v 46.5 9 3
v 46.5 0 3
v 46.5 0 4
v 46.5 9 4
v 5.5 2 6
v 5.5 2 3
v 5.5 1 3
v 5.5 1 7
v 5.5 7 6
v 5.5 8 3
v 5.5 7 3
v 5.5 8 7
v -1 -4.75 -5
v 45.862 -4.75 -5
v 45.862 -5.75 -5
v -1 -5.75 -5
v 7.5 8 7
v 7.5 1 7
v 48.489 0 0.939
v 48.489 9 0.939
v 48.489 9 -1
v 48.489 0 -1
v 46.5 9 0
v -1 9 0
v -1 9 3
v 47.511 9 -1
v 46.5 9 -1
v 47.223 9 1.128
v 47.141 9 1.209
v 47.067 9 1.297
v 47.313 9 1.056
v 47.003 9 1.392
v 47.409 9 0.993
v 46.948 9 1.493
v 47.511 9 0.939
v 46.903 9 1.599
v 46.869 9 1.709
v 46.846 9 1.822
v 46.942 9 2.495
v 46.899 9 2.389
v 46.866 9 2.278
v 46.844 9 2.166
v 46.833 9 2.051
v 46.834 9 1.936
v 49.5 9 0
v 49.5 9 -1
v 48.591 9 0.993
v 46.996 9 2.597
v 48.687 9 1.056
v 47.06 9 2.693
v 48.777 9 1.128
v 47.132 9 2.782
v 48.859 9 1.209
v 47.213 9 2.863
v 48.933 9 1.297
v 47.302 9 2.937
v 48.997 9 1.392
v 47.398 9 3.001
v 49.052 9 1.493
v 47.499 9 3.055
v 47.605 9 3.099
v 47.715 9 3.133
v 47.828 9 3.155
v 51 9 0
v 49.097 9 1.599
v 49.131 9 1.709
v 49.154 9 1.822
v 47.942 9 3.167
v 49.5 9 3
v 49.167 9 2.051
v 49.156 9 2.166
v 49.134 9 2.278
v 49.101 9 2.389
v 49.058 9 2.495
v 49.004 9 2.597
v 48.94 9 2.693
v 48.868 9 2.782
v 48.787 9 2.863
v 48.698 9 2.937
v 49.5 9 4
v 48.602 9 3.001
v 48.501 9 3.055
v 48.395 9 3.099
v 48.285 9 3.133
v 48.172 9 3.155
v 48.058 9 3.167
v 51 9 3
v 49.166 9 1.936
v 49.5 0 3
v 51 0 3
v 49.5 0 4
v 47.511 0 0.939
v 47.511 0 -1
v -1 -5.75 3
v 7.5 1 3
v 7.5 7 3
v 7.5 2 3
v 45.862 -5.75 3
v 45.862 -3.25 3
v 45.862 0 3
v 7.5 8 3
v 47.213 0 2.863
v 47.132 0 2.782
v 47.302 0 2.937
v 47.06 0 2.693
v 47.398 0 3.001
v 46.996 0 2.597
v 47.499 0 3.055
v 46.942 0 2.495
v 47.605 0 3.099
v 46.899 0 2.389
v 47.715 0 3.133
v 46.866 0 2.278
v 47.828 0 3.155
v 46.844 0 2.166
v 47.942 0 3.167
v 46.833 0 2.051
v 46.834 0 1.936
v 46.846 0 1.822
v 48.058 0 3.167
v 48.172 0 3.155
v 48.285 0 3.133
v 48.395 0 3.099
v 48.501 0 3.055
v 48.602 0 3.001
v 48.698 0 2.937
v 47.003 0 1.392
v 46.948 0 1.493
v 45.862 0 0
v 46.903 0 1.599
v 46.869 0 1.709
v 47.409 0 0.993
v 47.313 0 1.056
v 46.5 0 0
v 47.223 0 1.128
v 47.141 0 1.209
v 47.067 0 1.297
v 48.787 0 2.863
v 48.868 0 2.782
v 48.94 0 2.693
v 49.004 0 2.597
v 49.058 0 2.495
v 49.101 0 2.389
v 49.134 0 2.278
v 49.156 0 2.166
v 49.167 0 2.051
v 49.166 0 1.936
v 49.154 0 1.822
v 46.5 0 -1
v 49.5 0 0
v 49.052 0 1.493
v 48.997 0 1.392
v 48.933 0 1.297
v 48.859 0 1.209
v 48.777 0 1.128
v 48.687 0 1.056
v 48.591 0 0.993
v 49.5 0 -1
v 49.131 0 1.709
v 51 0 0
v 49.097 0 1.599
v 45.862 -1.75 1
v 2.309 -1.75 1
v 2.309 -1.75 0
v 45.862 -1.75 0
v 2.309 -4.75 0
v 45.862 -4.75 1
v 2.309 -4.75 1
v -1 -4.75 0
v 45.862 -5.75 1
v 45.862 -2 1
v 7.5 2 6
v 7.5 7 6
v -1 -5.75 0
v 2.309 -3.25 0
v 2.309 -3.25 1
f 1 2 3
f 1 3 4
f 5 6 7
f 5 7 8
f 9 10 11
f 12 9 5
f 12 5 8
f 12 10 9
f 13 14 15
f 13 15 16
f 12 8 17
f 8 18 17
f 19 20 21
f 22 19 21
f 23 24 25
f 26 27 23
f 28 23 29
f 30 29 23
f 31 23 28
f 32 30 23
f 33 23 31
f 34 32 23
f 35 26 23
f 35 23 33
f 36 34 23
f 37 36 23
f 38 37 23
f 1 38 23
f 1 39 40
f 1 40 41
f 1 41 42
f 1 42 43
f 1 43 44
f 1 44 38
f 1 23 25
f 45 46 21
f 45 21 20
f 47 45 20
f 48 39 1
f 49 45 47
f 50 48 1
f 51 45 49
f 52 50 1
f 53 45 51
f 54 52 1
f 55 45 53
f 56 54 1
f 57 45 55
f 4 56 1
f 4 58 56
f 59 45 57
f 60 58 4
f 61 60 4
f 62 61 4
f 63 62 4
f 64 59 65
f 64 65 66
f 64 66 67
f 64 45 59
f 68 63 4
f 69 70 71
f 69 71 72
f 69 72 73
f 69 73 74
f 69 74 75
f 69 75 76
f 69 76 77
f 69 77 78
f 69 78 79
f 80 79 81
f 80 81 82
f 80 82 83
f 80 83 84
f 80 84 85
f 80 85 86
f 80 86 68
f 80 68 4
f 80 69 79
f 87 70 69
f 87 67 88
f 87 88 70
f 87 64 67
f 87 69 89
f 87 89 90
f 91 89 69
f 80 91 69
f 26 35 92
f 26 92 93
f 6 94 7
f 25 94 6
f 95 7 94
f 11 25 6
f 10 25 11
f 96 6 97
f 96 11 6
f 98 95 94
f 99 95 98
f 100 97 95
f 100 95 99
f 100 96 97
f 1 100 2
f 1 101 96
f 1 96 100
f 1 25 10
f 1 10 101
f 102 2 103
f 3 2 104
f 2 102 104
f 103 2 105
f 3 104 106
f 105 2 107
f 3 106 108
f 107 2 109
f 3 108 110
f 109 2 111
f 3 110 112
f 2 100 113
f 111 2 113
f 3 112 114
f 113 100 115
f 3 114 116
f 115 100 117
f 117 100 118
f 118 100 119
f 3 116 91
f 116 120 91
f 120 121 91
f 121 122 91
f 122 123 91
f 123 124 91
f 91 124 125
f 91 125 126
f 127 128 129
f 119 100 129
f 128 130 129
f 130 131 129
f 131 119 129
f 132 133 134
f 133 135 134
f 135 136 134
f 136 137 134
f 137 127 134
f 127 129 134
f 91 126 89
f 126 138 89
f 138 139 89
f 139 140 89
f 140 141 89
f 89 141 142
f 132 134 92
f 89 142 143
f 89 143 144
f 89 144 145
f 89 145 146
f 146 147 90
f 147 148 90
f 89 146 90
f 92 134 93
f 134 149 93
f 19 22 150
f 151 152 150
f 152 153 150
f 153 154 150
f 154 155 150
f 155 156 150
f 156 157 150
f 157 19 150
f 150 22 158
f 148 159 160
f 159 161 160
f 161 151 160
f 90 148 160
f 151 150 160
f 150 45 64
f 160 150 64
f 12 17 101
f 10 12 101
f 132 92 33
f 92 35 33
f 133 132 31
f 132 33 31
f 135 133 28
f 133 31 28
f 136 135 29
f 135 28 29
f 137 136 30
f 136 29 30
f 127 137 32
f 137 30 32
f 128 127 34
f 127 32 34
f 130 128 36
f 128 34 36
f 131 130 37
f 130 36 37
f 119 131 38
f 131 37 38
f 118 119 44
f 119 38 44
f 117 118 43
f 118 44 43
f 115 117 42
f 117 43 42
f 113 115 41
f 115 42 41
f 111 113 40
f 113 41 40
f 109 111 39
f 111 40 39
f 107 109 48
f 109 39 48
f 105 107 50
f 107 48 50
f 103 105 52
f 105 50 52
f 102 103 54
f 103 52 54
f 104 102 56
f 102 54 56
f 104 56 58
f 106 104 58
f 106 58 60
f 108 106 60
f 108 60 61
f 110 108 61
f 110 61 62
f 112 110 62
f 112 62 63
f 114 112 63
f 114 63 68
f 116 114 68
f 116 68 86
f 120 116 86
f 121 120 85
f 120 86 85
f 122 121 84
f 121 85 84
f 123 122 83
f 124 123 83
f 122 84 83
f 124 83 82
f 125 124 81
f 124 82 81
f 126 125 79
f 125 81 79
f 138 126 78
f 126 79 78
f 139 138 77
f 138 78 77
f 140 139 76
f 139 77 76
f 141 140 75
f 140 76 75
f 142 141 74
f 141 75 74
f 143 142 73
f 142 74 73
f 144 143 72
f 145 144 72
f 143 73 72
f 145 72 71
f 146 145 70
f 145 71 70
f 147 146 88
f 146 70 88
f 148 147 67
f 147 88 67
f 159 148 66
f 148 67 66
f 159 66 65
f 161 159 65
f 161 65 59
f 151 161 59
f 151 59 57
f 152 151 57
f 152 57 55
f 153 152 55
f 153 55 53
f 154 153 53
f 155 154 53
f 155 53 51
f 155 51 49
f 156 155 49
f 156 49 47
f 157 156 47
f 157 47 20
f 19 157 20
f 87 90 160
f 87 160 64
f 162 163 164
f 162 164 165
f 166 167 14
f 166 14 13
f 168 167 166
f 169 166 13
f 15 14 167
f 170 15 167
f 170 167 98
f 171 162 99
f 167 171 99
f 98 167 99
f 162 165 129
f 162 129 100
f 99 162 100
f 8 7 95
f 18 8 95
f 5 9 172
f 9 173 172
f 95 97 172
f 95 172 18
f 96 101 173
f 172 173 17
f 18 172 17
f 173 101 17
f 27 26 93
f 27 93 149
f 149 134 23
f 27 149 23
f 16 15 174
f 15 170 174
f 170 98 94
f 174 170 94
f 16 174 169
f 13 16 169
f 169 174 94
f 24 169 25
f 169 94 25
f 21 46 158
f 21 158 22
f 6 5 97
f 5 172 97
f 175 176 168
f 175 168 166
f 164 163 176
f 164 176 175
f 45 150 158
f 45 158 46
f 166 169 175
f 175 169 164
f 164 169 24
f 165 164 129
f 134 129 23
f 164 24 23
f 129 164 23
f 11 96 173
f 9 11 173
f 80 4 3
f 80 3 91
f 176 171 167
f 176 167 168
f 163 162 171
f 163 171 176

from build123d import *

# Parameters (mm, degrees)
SKETCH2_W            = 53
SKETCH2_H            = 9
BOSS_EXTRUDE1_DEPTH  = 3
SKETCH11_W           = 2
SKETCH11_H           = 9
CUT_EXTRUDE3_DEPTH   = 5
SKETCH12_W           = 3
SKETCH12_H           = 9
BOSS_EXTRUDE7_DEPTH  = 1
SKETCH13_W           = 1
SKETCH13_H           = 1
BOSS_EXTRUDE8_DEPTH  = 4
SKETCH14_W           = 1
SKETCH14_H           = 1
BOSS_EXTRUDE9_DEPTH  = 5
SKETCH15_W           = 45.862173985
SKETCH15_H           = 3
BOSS_EXTRUDE10_DEPTH = 1.5
SKETCH25_W           = 3
SKETCH25_H           = 9
BOSS_EXTRUDE13_DEPTH = 1
SKETCH24_R           = 1.16794594
CUT_EXTRUDE7_DEPTH   = 9
SKETCH26_W           = 0.9784551
SKETCH26_H           = 1.939455742
CUT_EXTRUDE8_DEPTH   = 9
SKETCH27_W           = 45.862173985
SKETCH27_H           = 3
BOSS_EXTRUDE14_DEPTH = 2
SKETCH28_W           = 41.224865511
SKETCH28_H           = 1
CUT_EXTRUDE9_DEPTH   = 1.5
SKETCH29_W           = 3
SKETCH29_H           = 12.5
BOSS_EXTRUDE15_DEPTH = 1
BOSS_EXTRUDE16_DEPTH = 1
SKETCH31_W           = 2.328454802
SKETCH31_H           = 1
CUT_EXTRUDE10_DEPTH  = 1.5
BOSS_EXTRUDE17_DEPTH = 2
BOSS_EXTRUDE18_REACH = 53.942
SKETCH34_W           = 46.86
SKETCH34_H           = 1.5
SKETCH35_W           = 43.553320313
SKETCH35_H           = 1.25
CUT_EXTRUDE11_DEPTH  = 1
CUT_EXTRUDE12_REACH  = 54.259
SKETCH36_W           = 46.86
SKETCH36_H           = 3.75
SKETCH37_W           = 2
SKETCH37_H           = 2.25
CUT_EXTRUDE13_DEPTH  = 10
BOSS_EXTRUDE19_DEPTH = 2.5
SKETCH42_W           = 43.553320313
SKETCH42_H           = 1
BOSS_EXTRUDE20_DEPTH = 1
SKETCH44_W           = 46.862173985
SKETCH44_H           = 1
BOSS_EXTRUDE21_DEPTH = 5
SKETCH46_W           = 43.553320313
SKETCH46_H           = 1
BOSS_EXTRUDE22_DEPTH = 1


with BuildPart() as part:
    # Sketch2 → Boss-Extrude1 (new body)
    with BuildSketch(Plane.XY):
        with Locations((26.5, 4.5)):
            Rectangle(SKETCH2_W, SKETCH2_H)
    extrude(amount=BOSS_EXTRUDE1_DEPTH)

    # Sketch11 → Cut-Extrude3 (cut)
    with BuildSketch(Plane.XY.offset(3)):
        with Locations((52, 4.5)):
            Rectangle(SKETCH11_W, SKETCH11_H)
    extrude(amount=-CUT_EXTRUDE3_DEPTH, mode=Mode.SUBTRACT)

    # Sketch12 → Boss-Extrude7 (add)
    with BuildSketch(Plane.XY.offset(3)):
        with Locations((48, 4.5)):
            Rectangle(SKETCH12_W, SKETCH12_H)
    extrude(amount=BOSS_EXTRUDE7_DEPTH)

    # Sketch13 → Boss-Extrude8 (add)
    with BuildSketch(Plane.XY.offset(3)):
        with Locations((7, 7.5)):
            Rectangle(SKETCH13_W, SKETCH13_H)
        with Locations((7, 1.5)):
            Rectangle(SKETCH13_W, SKETCH13_H)
    extrude(amount=BOSS_EXTRUDE8_DEPTH)

    # Sketch14 → Boss-Extrude9 (add)
    with BuildSketch(Plane.XZ.offset(-7)):
        with Locations((7, 6.5)):
            Rectangle(SKETCH14_W, SKETCH14_H)
    extrude(amount=BOSS_EXTRUDE9_DEPTH)

    # Sketch15 → Boss-Extrude10 (add)
    with BuildSketch(Plane.XZ):
        with Locations((22.931086993, 1.5)):
            Rectangle(SKETCH15_W, SKETCH15_H)
    extrude(amount=BOSS_EXTRUDE10_DEPTH)

    # Sketch25 → Boss-Extrude13 (add)
    with BuildSketch(Plane(origin=(0, 0, 0), x_dir=(-1, 0, 0), z_dir=(0, 0, -1))):
        with Locations((-48, 4.5)):
            Rectangle(SKETCH25_W, SKETCH25_H)
    extrude(amount=BOSS_EXTRUDE13_DEPTH)

    # Sketch24 → Cut-Extrude7 (cut)
    with BuildSketch(Plane(origin=(0, 9, 0), x_dir=(1, 0, 0), z_dir=(0, 1, 0))):
        with Locations(Location((48, -2, 0), (0, 0, 270))):
            Circle(SKETCH24_R)
    extrude(amount=-CUT_EXTRUDE7_DEPTH, mode=Mode.SUBTRACT)

    # Sketch26 → Cut-Extrude8 (cut)
    with BuildSketch(Plane(origin=(0, 9, 0), x_dir=(1, 0, 0), z_dir=(0, 1, 0))):
        with Locations((48, 0.030272129)):
            Rectangle(SKETCH26_W, SKETCH26_H)
    extrude(amount=-CUT_EXTRUDE8_DEPTH, mode=Mode.SUBTRACT)

    # Sketch27 → Boss-Extrude14 (add)
    with BuildSketch(Plane.XZ.offset(1.5)):
        with Locations((22.931086993, 1.5)):
            Rectangle(SKETCH27_W, SKETCH27_H)
    extrude(amount=BOSS_EXTRUDE14_DEPTH)

    # Sketch28 → Cut-Extrude9 (cut)
    with BuildSketch(Plane.XZ.offset(3.5)):
        with Locations((22.921286428, 0.5)):
            Rectangle(SKETCH28_W, SKETCH28_H)
    extrude(amount=-CUT_EXTRUDE9_DEPTH, mode=Mode.SUBTRACT)

    # Sketch29 → Boss-Extrude15 (add)
    with BuildSketch(Plane.ZY):
        with Locations((1.5, 2.75)):
            Rectangle(SKETCH29_W, SKETCH29_H)
    extrude(amount=BOSS_EXTRUDE15_DEPTH)

    # Sketch30 → Boss-Extrude16 (add)
    with BuildSketch(Plane.ZY.offset(-6.5)):
        Polygon((3, 8), (3, 7), (6, 7), (6, 2), (3, 2), (3, 1), (7, 1), (7, 8), align=None)
    extrude(amount=BOSS_EXTRUDE16_DEPTH)

    # Sketch31 → Cut-Extrude10 (cut)
    with BuildSketch(Plane.XZ.offset(3.5)):
        with Locations((44.697946584, 0.5)):
            Rectangle(SKETCH31_W, SKETCH31_H)
    extrude(amount=-CUT_EXTRUDE10_DEPTH, mode=Mode.SUBTRACT)

    # Sketch32 → Boss-Extrude17 (add)
    with BuildSketch(Plane.XZ.offset(3.5)):
        Polygon((-1, 3), (-1, 0), (2.308853672, 0), (2.308853672, 1), (45.862173985, 1), (45.862173985, 3), align=None)
    extrude(amount=BOSS_EXTRUDE17_DEPTH)

    # Boss-Extrude18: up to this face of the body (flat: up to its plane)
    boss_extrude18_end = Plane(part.part.faces().sort_by_distance((22.213634354, 3.353188918, 0))[0])
    # Sketch34 → Boss-Extrude18 (add, up to the picked face)
    with BuildSketch(Plane.XY.offset(3), mode=Mode.PRIVATE) as boss_extrude18_sk1:
        with Locations((22.43, -6.25)):
            Rectangle(SKETCH34_W, SKETCH34_H)
    boss_extrude18_tool1 = split(extrude(boss_extrude18_sk1.sketch, amount=-BOSS_EXTRUDE18_REACH, mode=Mode.PRIVATE), bisect_by=boss_extrude18_end, keep=Keep.BOTH, mode=Mode.PRIVATE)
    add(boss_extrude18_tool1.solids().sort_by(Axis((22.43, -6.25, 3), (0, 0, -1)))[0])

    # Sketch35 → Cut-Extrude11 (cut)
    with BuildSketch(Plane(origin=(0, 0, 0), x_dir=(-1, 0, 0), z_dir=(0, 0, -1))):
        with Locations((-24.085513829, -1.375)):
            Rectangle(SKETCH35_W, SKETCH35_H)
    extrude(amount=-CUT_EXTRUDE11_DEPTH, mode=Mode.SUBTRACT)

    # Cut-Extrude12: up to this face of the body (flat: up to its plane)
    cut_extrude12_end = Plane(part.part.faces().sort_by_distance((50.25, 4.5, 3))[0])
    # Sketch36 → Cut-Extrude12 (cut, up to the picked face)
    with BuildSketch(Plane(origin=(0, 0, 0), x_dir=(-1, 0, 0), z_dir=(0, 0, -1)), mode=Mode.PRIVATE) as cut_extrude12_sk1:
        with Locations((-22.43, -5.125)):
            Rectangle(SKETCH36_W, SKETCH36_H)
    cut_extrude12_tool1 = split(extrude(cut_extrude12_sk1.sketch, amount=-CUT_EXTRUDE12_REACH, mode=Mode.PRIVATE), bisect_by=cut_extrude12_end, keep=Keep.BOTH, mode=Mode.PRIVATE)
    add(cut_extrude12_tool1.solids().sort_by(Axis((22.43, -5.125, 0), (0, 0, 1)))[0], mode=Mode.SUBTRACT)

    # Sketch37 → Cut-Extrude13 (cut)
    with BuildSketch(Plane.ZY.offset(-45.86)):
        with Locations((2, -4.375)):
            Rectangle(SKETCH37_W, SKETCH37_H)
    extrude(amount=-CUT_EXTRUDE13_DEPTH, mode=Mode.SUBTRACT)

    # Sketch41 → Boss-Extrude19 (add)
    with BuildSketch(Plane.XZ.offset(3.25)):
        Polygon((-1, 0), (-1, 3), (45.862173985, 3), (45.862173985, 1), (2.308853672, 1), (2.308853672, 0), align=None)
    extrude(amount=BOSS_EXTRUDE19_DEPTH)

    # Sketch42 → Boss-Extrude20 (add)
    with BuildSketch(Plane(origin=(0, 0, 1), x_dir=(-1, 0, 0), z_dir=(0, 0, -1))):
        with Locations((-24.085513829, -5.25)):
            Rectangle(SKETCH42_W, SKETCH42_H)
    extrude(amount=BOSS_EXTRUDE20_DEPTH)

    # Sketch44 → Boss-Extrude21 (add)
    with BuildSketch(Plane(origin=(0, 0, 0), x_dir=(-1, 0, 0), z_dir=(0, 0, -1))):
        with Locations((-22.431086993, -5.25)):
            Rectangle(SKETCH44_W, SKETCH44_H)
    extrude(amount=BOSS_EXTRUDE21_DEPTH)

    # Sketch46 → Boss-Extrude22 (add)
    with BuildSketch(Plane.XZ.offset(0.75)):
        with Locations((24.085513829, 0.5)):
            Rectangle(SKETCH46_W, SKETCH46_H)
    extrude(amount=BOSS_EXTRUDE22_DEPTH)


solid = part.part
